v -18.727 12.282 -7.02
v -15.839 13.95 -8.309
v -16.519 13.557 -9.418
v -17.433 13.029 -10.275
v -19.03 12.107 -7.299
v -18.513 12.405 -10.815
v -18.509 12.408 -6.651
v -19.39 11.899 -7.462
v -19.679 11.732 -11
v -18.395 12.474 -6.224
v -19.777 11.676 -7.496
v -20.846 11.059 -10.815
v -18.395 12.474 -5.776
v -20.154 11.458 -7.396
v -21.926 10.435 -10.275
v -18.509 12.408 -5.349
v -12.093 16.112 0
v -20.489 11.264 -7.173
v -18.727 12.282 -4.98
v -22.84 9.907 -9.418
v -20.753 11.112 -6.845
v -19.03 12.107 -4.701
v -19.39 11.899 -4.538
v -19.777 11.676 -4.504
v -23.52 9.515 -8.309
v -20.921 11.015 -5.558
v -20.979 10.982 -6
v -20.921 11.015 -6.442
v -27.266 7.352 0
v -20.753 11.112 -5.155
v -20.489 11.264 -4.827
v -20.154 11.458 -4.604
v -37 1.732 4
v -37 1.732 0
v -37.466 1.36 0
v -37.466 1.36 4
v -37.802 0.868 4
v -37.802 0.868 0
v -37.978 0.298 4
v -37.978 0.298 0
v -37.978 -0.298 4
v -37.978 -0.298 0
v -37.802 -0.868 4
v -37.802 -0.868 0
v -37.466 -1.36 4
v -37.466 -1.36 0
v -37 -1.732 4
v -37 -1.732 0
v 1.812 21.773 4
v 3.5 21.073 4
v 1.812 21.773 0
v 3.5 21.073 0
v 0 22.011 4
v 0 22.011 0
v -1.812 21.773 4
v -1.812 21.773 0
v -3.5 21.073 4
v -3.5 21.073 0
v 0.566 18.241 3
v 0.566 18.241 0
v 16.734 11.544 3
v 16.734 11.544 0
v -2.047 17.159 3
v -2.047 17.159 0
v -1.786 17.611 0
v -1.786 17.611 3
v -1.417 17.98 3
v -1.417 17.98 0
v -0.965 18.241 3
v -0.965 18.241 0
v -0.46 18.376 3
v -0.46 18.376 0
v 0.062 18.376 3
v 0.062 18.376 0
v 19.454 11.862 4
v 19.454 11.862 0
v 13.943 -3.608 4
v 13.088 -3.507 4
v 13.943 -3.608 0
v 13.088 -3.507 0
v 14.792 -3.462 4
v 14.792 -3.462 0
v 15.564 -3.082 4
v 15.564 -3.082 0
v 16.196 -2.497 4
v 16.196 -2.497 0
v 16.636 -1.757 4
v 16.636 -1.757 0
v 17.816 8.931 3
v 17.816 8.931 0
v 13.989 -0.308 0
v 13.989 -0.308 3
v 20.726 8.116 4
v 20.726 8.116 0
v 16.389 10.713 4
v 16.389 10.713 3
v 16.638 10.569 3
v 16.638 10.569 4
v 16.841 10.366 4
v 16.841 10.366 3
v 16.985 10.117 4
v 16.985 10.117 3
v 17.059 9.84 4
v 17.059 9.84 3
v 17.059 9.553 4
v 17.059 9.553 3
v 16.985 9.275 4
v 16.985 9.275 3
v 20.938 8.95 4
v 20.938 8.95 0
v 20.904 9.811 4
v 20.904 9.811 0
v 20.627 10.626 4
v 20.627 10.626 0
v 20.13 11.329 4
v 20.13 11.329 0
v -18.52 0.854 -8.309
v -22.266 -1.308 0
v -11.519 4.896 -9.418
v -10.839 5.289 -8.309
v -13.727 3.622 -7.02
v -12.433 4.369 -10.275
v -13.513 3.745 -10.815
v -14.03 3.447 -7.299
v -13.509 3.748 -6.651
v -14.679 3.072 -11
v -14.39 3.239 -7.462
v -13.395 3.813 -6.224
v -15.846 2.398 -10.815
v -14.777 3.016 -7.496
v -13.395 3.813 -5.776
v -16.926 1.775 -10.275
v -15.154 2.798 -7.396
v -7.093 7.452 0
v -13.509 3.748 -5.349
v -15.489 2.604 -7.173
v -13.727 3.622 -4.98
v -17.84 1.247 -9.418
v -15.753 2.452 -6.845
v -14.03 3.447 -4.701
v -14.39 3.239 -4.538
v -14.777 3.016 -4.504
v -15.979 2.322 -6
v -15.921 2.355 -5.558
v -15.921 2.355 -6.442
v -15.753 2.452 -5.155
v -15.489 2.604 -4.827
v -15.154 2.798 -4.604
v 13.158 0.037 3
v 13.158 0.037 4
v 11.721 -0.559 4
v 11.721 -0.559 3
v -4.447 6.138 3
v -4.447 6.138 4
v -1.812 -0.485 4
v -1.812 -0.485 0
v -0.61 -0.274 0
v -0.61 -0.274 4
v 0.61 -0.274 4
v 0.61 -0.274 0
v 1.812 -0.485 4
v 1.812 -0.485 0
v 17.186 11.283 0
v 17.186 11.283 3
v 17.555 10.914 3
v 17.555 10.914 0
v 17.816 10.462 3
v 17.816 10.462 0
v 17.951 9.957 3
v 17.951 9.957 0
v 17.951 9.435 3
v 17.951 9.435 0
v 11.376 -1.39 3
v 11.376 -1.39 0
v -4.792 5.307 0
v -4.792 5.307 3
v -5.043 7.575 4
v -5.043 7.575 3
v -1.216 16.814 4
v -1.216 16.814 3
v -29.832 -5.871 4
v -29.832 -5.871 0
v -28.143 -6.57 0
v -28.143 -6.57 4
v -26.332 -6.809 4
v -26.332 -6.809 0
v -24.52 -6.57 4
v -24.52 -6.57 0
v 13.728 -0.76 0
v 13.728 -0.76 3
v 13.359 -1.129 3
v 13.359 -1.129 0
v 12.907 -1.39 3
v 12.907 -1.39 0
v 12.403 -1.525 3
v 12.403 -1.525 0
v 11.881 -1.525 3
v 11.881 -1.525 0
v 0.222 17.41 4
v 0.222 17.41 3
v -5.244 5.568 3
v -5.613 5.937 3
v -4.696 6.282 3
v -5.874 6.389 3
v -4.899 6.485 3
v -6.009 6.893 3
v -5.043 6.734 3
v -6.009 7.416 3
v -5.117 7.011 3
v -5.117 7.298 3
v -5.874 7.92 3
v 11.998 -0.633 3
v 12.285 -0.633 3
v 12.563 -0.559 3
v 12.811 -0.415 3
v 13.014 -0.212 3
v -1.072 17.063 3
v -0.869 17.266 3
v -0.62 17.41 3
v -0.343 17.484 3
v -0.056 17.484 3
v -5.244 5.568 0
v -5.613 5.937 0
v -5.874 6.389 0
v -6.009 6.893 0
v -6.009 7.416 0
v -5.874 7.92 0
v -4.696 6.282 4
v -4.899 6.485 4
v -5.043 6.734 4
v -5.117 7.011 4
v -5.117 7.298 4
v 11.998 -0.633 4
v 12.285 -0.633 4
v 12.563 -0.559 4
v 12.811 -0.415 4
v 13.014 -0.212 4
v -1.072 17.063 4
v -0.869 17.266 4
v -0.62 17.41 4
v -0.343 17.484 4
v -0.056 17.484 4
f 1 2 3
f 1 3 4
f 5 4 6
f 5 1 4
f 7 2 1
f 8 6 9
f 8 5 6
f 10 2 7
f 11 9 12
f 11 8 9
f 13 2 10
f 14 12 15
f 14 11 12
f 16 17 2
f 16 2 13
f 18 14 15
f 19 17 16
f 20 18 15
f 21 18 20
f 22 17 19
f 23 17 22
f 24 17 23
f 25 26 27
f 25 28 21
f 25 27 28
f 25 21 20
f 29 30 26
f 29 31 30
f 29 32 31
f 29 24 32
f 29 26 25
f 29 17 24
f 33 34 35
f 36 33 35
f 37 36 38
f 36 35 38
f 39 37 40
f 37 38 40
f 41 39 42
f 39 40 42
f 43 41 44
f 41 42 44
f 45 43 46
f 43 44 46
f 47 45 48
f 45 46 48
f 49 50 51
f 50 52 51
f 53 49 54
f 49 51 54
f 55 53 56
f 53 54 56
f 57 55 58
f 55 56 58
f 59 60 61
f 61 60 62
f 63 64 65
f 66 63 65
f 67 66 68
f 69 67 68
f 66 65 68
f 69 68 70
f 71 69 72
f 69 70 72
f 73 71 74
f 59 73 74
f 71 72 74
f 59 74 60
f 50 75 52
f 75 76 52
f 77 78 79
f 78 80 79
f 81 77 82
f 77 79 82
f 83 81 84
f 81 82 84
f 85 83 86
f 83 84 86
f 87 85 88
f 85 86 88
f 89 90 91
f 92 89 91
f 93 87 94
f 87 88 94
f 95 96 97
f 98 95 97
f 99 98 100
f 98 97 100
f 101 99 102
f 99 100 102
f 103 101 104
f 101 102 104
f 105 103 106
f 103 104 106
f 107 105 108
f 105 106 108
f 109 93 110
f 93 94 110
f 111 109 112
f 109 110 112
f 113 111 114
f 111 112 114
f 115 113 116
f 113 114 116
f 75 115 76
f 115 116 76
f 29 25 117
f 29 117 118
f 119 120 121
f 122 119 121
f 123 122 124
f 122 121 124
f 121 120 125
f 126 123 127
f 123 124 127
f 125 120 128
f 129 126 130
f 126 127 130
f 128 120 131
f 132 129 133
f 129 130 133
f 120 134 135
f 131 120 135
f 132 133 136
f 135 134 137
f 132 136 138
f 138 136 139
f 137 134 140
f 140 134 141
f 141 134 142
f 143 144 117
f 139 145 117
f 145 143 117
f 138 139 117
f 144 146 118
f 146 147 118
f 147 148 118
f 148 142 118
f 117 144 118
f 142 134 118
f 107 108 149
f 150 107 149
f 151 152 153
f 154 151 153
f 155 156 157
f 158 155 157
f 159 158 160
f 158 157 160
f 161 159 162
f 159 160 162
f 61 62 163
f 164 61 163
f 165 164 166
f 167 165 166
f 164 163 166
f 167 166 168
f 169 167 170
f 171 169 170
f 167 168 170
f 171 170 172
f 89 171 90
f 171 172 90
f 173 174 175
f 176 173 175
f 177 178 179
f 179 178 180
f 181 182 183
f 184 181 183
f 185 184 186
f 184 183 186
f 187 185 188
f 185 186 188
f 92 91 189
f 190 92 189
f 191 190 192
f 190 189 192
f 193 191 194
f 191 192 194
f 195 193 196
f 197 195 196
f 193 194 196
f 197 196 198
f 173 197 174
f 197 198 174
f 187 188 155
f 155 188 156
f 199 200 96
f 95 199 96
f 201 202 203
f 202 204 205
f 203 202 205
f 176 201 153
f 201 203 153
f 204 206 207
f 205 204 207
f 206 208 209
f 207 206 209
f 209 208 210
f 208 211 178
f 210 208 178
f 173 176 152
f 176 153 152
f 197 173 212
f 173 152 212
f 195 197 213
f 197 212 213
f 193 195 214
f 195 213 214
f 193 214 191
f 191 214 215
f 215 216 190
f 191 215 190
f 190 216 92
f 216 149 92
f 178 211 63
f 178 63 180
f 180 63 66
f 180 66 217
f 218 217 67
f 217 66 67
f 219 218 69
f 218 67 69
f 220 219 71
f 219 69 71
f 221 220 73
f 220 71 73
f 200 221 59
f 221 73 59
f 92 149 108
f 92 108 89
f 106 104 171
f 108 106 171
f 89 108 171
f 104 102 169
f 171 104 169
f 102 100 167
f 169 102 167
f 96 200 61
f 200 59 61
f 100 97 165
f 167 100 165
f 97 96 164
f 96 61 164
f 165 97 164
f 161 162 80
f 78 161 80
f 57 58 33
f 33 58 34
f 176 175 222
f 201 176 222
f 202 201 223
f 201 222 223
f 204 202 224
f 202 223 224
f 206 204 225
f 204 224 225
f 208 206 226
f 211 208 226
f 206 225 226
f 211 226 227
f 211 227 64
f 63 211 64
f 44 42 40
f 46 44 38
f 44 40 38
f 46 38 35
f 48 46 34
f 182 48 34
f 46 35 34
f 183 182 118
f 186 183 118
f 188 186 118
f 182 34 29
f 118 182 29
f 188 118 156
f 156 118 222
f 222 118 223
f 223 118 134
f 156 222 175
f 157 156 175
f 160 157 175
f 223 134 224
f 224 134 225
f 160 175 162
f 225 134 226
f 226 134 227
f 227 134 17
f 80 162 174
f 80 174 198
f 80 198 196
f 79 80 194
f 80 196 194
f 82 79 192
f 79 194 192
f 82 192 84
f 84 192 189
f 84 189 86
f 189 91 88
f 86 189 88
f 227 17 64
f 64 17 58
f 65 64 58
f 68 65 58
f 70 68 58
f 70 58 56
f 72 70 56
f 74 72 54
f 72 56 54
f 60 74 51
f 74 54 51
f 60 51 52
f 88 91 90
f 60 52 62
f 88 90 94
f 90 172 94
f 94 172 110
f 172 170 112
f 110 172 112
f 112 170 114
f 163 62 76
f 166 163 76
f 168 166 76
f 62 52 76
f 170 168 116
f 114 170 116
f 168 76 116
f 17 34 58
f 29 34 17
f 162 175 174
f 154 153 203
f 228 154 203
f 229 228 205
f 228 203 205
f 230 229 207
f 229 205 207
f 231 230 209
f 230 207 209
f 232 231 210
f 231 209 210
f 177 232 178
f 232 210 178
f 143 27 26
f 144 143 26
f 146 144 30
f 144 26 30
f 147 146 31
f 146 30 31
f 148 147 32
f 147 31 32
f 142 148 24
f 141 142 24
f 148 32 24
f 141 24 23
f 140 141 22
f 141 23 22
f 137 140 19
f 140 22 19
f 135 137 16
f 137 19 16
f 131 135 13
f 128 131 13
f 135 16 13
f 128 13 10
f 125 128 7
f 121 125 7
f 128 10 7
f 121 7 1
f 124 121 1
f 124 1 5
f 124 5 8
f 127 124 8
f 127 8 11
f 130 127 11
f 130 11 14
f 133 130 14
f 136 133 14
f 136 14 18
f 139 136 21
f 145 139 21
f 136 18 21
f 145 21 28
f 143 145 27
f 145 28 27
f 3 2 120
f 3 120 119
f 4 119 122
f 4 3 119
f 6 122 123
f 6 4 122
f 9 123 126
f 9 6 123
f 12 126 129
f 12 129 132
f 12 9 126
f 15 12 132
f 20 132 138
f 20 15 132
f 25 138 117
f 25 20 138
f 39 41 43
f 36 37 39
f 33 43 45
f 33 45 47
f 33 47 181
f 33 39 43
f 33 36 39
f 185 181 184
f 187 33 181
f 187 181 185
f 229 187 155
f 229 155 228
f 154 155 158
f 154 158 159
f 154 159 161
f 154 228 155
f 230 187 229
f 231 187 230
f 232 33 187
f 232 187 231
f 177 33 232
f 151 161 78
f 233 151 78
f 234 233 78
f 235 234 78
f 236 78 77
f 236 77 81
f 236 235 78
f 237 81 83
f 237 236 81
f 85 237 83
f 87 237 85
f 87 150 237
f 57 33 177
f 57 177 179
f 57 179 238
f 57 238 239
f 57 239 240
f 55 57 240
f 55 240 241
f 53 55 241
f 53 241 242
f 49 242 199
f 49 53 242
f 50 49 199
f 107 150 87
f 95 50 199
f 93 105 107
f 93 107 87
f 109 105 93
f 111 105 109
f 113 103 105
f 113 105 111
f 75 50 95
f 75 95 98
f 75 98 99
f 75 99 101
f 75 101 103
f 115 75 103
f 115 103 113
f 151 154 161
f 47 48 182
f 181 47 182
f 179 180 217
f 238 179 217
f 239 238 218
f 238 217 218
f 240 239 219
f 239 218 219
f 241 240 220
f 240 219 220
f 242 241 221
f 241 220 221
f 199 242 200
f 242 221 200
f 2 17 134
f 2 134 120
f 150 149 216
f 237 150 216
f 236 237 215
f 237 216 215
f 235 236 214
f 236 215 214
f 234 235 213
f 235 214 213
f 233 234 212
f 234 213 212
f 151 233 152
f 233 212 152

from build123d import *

# Parameters (mm, degrees)
F1_DEPTH = 3
F3_DEPTH = 1
F5_R     = 1.5
F6_DEPTH = 10


with BuildPart() as f1:
    # F0 (on Top) → F1 (new body)
    with BuildSketch(Plane.XY):
        with BuildLine():
            Line((-3.5, 21.073285), (-37, 1.732051))
            ThreePointArc((-37, 1.732051), (-38, 0), (-37, -1.732051))
            Line((-37, -1.732051), (-29.831544, -5.870761))
            ThreePointArc((-29.831544, -5.870761), (-27.245228, -6.748697), (-24.519811, -6.570064))
            Line((-24.519811, -6.570064), (-1.811733, -0.485452))
            ThreePointArc((-1.811733, -0.485452), (0, -0.246933), (1.811733, -0.485452))
            Line((1.811733, -0.485452), (13.088096, -3.506945))
            ThreePointArc((13.088096, -3.506945), (15.191419, -3.299786), (16.636192, -1.757218))
            Line((16.636192, -1.757218), (20.725817, 8.116009))
            ThreePointArc((20.725817, 8.116009), (20.794968, 10.228378), (19.454178, 11.862136))
            Line((19.454178, 11.862136), (3.5, 21.073285))
            ThreePointArc((3.5, 21.073285), (0, 22.011107), (-3.5, 21.073285))
        make_face()
        with BuildLine():
            Line((17.816219, 8.930998), (13.989385, -0.307797))
            ThreePointArc((13.989385, -0.307797), (12.906993, -1.39019), (11.376259, -1.39019))
            Line((11.376259, -1.39019), (-4.791633, 5.30677))
            ThreePointArc((-4.791633, 5.30677), (-5.874025, 6.389163), (-5.874025, 7.919896))
            Line((-5.874025, 7.919896), (-2.047191, 17.158692))
            ThreePointArc((-2.047191, 17.158692), (-0.964799, 18.241084), (0.565935, 18.241084))
            Line((0.565935, 18.241084), (16.733827, 11.544124))
            ThreePointArc((16.733827, 11.544124), (17.816219, 10.461732), (17.816219, 8.930998))
        make_face(mode=Mode.SUBTRACT)
    extrude(amount=F1_DEPTH)

    # F2 (on face) → F3 (join)
    with BuildSketch(Plane.XY.offset(3)):
        with BuildLine():
            Line((1.811733, -0.485452), (13.088096, -3.506945))
            ThreePointArc((13.088096, -3.506945), (15.191419, -3.299786), (16.636192, -1.757218))
            Line((16.636192, -1.757218), (20.725817, 8.116009))
            ThreePointArc((20.725817, 8.116009), (20.794968, 10.228378), (19.454178, 11.862136))
            Line((19.454178, 11.862136), (3.5, 21.073285))
            ThreePointArc((3.5, 21.073285), (0, 22.011107), (-3.5, 21.073285))
            Line((-3.5, 21.073285), (-37, 1.732051))
            ThreePointArc((-37, 1.732051), (-38, 0), (-37, -1.732051))
            Line((-37, -1.732051), (-29.831544, -5.870761))
            ThreePointArc((-29.831544, -5.870761), (-27.245228, -6.748697), (-24.519811, -6.570064))
            Line((-24.519811, -6.570064), (-1.811733, -0.485452))
            ThreePointArc((-1.811733, -0.485452), (0, -0.246933), (1.811733, -0.485452))
        make_face()
        with BuildLine():
            ThreePointArc((-4.447218, 6.138262), (-5.042533, 6.733578), (-5.042533, 7.575481))
            Line((-5.042533, 7.575481), (-1.215699, 16.814277))
            ThreePointArc((-1.215699, 16.814277), (-0.620383, 17.409592), (0.22152, 17.409592))
            Line((0.22152, 17.409592), (16.389412, 10.712632))
            ThreePointArc((16.389412, 10.712632), (16.984728, 10.117316), (16.984728, 9.275413))
            Line((16.984728, 9.275413), (13.157893, 0.036618))
            ThreePointArc((13.157893, 0.036618), (12.562578, -0.558698), (11.720674, -0.558698))
            Line((11.720674, -0.558698), (-4.447218, 6.138262))
        make_face(mode=Mode.SUBTRACT)
    extrude(amount=F3_DEPTH)

    # F5 (on face) → F6 (join)
    with BuildSketch(Plane(origin=(-10, 17.320508, 0), x_dir=(-0.866025, -0.5, 0), z_dir=(-0.5, 0.866025, 0))):
        with BuildLine():
            ThreePointArc((15.611969, -8.308743), (16.033625, -7.188429), (16.176915, -6))
            ThreePointArc((16.176915, -6), (9.988485, -1.14329), (6.74186, -8.308743))
            ThreePointArc((6.74186, -8.308743), (11.176915, -11), (15.611969, -8.308743))
        make_face()
        with Locations((11.176915, -6)):
            Circle(F5_R, mode=Mode.SUBTRACT)
        with BuildLine():
            ThreePointArc((6.74186, -8.308743), (9.988485, -1.14329), (16.176915, -6))
            ThreePointArc((16.176915, -6), (16.033625, -7.188429), (15.611969, -8.308743))
            Line((15.611969, -8.308743), (19.937227, 0))
            Line((19.937227, 0), (2.416602, 0))
            Line((2.416602, 0), (6.74186, -8.308743))
        make_face()
    extrude(amount=-F6_DEPTH)


solid = f1.part
